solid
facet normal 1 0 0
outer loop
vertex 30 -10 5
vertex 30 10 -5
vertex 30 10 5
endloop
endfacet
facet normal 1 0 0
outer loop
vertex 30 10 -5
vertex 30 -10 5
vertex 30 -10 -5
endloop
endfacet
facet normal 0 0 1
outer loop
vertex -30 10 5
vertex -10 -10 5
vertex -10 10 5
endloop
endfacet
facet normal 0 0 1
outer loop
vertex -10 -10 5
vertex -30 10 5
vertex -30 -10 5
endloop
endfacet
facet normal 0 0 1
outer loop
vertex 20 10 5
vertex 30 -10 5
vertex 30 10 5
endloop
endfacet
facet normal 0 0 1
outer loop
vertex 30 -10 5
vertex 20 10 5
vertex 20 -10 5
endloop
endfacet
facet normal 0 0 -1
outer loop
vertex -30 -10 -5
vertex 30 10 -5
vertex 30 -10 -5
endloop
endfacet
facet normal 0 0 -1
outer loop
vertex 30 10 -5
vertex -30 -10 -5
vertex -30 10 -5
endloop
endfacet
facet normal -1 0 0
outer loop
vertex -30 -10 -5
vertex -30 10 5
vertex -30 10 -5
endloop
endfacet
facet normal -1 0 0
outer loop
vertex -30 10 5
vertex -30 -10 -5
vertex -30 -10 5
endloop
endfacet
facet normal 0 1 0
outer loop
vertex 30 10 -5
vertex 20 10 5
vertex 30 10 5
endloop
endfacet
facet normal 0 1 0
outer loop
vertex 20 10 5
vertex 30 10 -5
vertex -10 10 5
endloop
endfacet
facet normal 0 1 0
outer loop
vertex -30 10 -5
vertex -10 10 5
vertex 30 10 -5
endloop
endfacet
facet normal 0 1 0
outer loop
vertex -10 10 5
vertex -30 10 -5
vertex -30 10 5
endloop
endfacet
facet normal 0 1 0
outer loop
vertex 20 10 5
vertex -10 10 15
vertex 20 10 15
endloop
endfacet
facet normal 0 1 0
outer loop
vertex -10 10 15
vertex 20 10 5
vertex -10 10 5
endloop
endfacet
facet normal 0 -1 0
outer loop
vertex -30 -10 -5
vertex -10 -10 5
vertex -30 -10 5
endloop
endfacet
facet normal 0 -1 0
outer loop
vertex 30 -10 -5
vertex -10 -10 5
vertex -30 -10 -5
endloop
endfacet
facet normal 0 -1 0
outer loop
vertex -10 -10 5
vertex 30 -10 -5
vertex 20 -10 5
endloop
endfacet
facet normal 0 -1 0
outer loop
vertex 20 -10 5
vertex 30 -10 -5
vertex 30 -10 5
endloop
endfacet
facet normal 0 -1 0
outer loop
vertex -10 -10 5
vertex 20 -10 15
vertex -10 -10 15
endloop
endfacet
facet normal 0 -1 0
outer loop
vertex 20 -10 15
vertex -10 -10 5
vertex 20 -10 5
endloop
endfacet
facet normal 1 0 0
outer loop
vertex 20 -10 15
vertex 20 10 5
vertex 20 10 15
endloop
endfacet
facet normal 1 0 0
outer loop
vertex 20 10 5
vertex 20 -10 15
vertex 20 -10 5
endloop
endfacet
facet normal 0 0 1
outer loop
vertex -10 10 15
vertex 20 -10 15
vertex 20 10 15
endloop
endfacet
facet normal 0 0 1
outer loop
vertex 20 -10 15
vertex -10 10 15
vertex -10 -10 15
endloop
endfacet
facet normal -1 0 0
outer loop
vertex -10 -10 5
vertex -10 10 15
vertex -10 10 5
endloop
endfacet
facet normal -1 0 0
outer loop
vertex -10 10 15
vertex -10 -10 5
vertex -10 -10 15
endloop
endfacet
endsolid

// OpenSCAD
cube([60,20,10],center=true);
translate([5,0,10])
    cube([30,20,10],center=true);
